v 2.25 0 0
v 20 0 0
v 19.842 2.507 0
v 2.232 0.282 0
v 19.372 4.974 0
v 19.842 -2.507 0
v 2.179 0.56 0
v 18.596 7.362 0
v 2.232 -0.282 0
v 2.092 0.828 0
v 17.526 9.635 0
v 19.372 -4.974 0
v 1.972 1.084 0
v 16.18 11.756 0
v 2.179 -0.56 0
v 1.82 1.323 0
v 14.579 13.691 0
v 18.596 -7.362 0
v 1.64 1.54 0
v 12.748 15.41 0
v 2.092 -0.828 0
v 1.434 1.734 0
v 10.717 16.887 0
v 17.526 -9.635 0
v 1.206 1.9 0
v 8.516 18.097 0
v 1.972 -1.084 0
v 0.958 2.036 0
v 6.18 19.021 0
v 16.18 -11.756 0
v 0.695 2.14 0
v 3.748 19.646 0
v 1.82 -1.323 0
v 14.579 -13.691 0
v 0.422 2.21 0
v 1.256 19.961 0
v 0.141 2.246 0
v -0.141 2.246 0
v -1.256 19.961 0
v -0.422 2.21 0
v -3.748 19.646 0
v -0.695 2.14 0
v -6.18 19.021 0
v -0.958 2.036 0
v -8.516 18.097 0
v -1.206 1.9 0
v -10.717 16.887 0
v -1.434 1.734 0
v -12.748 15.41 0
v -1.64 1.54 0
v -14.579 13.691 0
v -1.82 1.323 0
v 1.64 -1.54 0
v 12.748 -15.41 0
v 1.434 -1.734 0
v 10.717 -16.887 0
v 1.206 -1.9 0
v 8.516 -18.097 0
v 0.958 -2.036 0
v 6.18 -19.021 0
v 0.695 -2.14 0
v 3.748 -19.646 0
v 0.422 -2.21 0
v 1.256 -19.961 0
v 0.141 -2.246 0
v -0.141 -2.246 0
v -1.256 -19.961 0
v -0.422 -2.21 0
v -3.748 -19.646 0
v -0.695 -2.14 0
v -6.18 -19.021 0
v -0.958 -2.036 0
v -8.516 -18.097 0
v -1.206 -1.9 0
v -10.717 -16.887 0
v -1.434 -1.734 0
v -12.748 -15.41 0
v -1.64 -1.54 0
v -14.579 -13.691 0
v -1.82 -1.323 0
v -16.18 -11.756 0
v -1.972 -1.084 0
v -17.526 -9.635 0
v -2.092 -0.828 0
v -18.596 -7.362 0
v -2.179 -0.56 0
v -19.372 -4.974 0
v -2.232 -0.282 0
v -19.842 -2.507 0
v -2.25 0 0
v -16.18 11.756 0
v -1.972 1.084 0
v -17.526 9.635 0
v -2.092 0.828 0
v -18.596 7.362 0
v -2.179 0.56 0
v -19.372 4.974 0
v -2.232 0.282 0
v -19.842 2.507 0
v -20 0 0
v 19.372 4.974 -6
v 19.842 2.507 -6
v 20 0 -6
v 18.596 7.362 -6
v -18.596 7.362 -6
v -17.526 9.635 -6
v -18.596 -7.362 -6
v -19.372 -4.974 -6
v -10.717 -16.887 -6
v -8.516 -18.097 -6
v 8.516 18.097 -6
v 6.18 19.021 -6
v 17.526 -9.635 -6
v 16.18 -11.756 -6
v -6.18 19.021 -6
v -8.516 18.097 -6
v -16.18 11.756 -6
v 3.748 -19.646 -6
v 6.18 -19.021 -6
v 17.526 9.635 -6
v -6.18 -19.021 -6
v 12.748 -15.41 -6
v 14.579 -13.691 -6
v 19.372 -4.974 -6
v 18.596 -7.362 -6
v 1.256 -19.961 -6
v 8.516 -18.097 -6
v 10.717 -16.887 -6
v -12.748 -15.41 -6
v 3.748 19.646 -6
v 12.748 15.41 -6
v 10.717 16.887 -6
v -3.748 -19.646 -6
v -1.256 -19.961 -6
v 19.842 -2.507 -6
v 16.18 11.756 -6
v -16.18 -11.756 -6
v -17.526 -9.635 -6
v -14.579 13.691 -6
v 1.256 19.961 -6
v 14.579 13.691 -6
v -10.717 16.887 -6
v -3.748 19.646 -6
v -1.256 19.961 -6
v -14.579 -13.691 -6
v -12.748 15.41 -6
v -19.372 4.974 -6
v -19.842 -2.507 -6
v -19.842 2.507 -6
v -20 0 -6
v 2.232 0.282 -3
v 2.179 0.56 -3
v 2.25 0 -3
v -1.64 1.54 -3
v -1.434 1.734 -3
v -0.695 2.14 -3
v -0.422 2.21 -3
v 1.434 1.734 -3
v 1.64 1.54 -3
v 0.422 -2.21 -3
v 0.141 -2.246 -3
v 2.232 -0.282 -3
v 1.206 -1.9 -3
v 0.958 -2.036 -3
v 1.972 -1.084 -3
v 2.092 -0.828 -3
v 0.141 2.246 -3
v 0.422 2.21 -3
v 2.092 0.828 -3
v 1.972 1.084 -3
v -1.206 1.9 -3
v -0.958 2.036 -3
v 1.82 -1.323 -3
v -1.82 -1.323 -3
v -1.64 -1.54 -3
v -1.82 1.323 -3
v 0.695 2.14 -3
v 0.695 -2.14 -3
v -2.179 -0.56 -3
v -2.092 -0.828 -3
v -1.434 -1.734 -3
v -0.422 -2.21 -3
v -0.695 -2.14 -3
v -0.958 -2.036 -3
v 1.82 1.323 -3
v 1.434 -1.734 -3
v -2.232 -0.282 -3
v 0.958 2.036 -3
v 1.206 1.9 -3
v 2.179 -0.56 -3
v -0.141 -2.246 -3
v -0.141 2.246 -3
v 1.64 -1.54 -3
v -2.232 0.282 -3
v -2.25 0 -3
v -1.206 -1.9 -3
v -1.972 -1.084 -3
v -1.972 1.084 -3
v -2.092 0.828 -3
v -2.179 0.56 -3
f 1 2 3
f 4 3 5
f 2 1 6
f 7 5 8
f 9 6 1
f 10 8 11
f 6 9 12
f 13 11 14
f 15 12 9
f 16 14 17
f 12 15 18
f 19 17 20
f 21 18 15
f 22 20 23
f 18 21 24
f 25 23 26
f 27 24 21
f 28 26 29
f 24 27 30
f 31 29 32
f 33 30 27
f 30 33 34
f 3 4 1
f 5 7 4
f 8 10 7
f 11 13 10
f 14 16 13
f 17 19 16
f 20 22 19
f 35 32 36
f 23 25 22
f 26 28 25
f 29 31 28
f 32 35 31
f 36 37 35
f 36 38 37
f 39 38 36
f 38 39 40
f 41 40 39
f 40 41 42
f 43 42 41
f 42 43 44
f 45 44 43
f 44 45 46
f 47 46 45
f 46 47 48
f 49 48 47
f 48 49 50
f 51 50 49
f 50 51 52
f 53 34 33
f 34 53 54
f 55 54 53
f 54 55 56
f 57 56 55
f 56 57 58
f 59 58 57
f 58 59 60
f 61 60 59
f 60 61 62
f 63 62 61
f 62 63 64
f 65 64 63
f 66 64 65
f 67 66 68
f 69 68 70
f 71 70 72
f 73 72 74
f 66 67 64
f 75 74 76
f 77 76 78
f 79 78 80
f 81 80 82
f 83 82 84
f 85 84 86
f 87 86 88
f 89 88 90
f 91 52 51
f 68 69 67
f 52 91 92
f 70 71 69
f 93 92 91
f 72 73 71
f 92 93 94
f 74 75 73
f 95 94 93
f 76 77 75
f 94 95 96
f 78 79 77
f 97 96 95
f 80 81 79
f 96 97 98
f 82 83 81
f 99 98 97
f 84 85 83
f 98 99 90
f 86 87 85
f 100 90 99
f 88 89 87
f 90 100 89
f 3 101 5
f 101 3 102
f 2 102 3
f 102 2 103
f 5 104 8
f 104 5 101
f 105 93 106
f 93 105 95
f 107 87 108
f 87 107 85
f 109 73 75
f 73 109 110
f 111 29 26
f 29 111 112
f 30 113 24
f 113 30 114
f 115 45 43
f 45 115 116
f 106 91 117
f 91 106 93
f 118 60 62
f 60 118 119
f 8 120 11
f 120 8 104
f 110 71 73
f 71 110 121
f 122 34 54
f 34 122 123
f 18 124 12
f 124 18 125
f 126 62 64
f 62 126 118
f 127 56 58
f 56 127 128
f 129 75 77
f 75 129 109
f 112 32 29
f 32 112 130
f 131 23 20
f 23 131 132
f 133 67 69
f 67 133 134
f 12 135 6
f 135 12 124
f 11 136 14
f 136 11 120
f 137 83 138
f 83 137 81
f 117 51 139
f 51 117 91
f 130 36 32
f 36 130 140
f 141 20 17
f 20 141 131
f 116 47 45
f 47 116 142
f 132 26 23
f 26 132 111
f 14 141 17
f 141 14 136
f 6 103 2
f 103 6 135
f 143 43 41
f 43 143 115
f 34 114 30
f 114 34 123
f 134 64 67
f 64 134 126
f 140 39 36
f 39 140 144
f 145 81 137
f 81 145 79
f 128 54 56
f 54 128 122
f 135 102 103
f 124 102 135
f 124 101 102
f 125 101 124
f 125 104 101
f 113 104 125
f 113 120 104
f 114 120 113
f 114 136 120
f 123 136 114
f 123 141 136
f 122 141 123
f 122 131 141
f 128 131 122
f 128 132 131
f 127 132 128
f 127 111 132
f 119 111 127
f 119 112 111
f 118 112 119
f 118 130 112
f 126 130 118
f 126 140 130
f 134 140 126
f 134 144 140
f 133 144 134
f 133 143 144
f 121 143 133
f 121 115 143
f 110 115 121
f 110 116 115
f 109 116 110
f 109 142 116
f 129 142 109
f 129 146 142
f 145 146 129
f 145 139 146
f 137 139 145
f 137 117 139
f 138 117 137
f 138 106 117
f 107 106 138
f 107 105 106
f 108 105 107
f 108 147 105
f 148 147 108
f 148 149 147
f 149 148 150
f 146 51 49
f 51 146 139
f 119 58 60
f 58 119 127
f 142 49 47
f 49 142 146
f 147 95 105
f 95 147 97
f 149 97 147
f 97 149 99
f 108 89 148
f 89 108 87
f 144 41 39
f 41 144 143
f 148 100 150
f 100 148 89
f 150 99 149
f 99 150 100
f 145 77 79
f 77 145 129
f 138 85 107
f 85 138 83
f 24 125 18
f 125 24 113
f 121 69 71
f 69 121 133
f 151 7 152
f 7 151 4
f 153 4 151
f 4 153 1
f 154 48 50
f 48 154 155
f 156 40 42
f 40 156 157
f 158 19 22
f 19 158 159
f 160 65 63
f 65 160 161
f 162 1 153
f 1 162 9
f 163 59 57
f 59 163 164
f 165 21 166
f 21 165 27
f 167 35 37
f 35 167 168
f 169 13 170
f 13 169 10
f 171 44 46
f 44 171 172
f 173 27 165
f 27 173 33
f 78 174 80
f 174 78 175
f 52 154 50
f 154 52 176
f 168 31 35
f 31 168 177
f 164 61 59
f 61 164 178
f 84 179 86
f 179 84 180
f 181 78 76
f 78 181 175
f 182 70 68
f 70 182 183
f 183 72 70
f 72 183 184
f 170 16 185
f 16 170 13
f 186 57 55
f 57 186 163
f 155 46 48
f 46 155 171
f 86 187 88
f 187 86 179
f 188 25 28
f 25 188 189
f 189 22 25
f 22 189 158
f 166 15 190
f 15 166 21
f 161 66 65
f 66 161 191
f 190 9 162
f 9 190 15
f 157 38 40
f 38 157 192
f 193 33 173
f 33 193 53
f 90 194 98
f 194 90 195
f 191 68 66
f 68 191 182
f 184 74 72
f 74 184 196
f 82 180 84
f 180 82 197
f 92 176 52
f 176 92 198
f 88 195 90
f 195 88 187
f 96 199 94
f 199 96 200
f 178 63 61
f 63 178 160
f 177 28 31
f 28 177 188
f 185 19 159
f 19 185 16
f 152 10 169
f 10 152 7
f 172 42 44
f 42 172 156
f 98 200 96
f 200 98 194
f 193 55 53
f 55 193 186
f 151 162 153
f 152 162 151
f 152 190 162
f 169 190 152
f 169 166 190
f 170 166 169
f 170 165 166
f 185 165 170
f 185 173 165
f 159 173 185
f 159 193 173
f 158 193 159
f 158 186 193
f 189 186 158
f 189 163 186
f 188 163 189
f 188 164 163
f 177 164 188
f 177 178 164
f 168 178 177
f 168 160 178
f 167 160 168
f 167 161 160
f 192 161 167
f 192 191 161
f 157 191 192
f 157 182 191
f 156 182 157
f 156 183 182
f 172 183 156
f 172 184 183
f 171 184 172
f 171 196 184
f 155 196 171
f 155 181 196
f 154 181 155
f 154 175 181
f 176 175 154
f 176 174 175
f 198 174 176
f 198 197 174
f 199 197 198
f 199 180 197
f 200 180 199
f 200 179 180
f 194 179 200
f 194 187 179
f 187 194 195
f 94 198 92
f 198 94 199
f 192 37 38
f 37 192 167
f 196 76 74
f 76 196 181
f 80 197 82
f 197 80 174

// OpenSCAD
$fn = 50;


difference() {
	union() {
		translate(v = [0, 0, -3.0000000000]) {
			cylinder(h = 3, r = 10.0000000000);
		}
		translate(v = [0, 0, -6.0000000000]) {
			cylinder(h = 6, r = 20.0000000000);
		}
	}
	union() {
		#translate(v = [0, 0, -3]) {
			cylinder(h = 3, r = 2.2500000000);
		}
	}
}
